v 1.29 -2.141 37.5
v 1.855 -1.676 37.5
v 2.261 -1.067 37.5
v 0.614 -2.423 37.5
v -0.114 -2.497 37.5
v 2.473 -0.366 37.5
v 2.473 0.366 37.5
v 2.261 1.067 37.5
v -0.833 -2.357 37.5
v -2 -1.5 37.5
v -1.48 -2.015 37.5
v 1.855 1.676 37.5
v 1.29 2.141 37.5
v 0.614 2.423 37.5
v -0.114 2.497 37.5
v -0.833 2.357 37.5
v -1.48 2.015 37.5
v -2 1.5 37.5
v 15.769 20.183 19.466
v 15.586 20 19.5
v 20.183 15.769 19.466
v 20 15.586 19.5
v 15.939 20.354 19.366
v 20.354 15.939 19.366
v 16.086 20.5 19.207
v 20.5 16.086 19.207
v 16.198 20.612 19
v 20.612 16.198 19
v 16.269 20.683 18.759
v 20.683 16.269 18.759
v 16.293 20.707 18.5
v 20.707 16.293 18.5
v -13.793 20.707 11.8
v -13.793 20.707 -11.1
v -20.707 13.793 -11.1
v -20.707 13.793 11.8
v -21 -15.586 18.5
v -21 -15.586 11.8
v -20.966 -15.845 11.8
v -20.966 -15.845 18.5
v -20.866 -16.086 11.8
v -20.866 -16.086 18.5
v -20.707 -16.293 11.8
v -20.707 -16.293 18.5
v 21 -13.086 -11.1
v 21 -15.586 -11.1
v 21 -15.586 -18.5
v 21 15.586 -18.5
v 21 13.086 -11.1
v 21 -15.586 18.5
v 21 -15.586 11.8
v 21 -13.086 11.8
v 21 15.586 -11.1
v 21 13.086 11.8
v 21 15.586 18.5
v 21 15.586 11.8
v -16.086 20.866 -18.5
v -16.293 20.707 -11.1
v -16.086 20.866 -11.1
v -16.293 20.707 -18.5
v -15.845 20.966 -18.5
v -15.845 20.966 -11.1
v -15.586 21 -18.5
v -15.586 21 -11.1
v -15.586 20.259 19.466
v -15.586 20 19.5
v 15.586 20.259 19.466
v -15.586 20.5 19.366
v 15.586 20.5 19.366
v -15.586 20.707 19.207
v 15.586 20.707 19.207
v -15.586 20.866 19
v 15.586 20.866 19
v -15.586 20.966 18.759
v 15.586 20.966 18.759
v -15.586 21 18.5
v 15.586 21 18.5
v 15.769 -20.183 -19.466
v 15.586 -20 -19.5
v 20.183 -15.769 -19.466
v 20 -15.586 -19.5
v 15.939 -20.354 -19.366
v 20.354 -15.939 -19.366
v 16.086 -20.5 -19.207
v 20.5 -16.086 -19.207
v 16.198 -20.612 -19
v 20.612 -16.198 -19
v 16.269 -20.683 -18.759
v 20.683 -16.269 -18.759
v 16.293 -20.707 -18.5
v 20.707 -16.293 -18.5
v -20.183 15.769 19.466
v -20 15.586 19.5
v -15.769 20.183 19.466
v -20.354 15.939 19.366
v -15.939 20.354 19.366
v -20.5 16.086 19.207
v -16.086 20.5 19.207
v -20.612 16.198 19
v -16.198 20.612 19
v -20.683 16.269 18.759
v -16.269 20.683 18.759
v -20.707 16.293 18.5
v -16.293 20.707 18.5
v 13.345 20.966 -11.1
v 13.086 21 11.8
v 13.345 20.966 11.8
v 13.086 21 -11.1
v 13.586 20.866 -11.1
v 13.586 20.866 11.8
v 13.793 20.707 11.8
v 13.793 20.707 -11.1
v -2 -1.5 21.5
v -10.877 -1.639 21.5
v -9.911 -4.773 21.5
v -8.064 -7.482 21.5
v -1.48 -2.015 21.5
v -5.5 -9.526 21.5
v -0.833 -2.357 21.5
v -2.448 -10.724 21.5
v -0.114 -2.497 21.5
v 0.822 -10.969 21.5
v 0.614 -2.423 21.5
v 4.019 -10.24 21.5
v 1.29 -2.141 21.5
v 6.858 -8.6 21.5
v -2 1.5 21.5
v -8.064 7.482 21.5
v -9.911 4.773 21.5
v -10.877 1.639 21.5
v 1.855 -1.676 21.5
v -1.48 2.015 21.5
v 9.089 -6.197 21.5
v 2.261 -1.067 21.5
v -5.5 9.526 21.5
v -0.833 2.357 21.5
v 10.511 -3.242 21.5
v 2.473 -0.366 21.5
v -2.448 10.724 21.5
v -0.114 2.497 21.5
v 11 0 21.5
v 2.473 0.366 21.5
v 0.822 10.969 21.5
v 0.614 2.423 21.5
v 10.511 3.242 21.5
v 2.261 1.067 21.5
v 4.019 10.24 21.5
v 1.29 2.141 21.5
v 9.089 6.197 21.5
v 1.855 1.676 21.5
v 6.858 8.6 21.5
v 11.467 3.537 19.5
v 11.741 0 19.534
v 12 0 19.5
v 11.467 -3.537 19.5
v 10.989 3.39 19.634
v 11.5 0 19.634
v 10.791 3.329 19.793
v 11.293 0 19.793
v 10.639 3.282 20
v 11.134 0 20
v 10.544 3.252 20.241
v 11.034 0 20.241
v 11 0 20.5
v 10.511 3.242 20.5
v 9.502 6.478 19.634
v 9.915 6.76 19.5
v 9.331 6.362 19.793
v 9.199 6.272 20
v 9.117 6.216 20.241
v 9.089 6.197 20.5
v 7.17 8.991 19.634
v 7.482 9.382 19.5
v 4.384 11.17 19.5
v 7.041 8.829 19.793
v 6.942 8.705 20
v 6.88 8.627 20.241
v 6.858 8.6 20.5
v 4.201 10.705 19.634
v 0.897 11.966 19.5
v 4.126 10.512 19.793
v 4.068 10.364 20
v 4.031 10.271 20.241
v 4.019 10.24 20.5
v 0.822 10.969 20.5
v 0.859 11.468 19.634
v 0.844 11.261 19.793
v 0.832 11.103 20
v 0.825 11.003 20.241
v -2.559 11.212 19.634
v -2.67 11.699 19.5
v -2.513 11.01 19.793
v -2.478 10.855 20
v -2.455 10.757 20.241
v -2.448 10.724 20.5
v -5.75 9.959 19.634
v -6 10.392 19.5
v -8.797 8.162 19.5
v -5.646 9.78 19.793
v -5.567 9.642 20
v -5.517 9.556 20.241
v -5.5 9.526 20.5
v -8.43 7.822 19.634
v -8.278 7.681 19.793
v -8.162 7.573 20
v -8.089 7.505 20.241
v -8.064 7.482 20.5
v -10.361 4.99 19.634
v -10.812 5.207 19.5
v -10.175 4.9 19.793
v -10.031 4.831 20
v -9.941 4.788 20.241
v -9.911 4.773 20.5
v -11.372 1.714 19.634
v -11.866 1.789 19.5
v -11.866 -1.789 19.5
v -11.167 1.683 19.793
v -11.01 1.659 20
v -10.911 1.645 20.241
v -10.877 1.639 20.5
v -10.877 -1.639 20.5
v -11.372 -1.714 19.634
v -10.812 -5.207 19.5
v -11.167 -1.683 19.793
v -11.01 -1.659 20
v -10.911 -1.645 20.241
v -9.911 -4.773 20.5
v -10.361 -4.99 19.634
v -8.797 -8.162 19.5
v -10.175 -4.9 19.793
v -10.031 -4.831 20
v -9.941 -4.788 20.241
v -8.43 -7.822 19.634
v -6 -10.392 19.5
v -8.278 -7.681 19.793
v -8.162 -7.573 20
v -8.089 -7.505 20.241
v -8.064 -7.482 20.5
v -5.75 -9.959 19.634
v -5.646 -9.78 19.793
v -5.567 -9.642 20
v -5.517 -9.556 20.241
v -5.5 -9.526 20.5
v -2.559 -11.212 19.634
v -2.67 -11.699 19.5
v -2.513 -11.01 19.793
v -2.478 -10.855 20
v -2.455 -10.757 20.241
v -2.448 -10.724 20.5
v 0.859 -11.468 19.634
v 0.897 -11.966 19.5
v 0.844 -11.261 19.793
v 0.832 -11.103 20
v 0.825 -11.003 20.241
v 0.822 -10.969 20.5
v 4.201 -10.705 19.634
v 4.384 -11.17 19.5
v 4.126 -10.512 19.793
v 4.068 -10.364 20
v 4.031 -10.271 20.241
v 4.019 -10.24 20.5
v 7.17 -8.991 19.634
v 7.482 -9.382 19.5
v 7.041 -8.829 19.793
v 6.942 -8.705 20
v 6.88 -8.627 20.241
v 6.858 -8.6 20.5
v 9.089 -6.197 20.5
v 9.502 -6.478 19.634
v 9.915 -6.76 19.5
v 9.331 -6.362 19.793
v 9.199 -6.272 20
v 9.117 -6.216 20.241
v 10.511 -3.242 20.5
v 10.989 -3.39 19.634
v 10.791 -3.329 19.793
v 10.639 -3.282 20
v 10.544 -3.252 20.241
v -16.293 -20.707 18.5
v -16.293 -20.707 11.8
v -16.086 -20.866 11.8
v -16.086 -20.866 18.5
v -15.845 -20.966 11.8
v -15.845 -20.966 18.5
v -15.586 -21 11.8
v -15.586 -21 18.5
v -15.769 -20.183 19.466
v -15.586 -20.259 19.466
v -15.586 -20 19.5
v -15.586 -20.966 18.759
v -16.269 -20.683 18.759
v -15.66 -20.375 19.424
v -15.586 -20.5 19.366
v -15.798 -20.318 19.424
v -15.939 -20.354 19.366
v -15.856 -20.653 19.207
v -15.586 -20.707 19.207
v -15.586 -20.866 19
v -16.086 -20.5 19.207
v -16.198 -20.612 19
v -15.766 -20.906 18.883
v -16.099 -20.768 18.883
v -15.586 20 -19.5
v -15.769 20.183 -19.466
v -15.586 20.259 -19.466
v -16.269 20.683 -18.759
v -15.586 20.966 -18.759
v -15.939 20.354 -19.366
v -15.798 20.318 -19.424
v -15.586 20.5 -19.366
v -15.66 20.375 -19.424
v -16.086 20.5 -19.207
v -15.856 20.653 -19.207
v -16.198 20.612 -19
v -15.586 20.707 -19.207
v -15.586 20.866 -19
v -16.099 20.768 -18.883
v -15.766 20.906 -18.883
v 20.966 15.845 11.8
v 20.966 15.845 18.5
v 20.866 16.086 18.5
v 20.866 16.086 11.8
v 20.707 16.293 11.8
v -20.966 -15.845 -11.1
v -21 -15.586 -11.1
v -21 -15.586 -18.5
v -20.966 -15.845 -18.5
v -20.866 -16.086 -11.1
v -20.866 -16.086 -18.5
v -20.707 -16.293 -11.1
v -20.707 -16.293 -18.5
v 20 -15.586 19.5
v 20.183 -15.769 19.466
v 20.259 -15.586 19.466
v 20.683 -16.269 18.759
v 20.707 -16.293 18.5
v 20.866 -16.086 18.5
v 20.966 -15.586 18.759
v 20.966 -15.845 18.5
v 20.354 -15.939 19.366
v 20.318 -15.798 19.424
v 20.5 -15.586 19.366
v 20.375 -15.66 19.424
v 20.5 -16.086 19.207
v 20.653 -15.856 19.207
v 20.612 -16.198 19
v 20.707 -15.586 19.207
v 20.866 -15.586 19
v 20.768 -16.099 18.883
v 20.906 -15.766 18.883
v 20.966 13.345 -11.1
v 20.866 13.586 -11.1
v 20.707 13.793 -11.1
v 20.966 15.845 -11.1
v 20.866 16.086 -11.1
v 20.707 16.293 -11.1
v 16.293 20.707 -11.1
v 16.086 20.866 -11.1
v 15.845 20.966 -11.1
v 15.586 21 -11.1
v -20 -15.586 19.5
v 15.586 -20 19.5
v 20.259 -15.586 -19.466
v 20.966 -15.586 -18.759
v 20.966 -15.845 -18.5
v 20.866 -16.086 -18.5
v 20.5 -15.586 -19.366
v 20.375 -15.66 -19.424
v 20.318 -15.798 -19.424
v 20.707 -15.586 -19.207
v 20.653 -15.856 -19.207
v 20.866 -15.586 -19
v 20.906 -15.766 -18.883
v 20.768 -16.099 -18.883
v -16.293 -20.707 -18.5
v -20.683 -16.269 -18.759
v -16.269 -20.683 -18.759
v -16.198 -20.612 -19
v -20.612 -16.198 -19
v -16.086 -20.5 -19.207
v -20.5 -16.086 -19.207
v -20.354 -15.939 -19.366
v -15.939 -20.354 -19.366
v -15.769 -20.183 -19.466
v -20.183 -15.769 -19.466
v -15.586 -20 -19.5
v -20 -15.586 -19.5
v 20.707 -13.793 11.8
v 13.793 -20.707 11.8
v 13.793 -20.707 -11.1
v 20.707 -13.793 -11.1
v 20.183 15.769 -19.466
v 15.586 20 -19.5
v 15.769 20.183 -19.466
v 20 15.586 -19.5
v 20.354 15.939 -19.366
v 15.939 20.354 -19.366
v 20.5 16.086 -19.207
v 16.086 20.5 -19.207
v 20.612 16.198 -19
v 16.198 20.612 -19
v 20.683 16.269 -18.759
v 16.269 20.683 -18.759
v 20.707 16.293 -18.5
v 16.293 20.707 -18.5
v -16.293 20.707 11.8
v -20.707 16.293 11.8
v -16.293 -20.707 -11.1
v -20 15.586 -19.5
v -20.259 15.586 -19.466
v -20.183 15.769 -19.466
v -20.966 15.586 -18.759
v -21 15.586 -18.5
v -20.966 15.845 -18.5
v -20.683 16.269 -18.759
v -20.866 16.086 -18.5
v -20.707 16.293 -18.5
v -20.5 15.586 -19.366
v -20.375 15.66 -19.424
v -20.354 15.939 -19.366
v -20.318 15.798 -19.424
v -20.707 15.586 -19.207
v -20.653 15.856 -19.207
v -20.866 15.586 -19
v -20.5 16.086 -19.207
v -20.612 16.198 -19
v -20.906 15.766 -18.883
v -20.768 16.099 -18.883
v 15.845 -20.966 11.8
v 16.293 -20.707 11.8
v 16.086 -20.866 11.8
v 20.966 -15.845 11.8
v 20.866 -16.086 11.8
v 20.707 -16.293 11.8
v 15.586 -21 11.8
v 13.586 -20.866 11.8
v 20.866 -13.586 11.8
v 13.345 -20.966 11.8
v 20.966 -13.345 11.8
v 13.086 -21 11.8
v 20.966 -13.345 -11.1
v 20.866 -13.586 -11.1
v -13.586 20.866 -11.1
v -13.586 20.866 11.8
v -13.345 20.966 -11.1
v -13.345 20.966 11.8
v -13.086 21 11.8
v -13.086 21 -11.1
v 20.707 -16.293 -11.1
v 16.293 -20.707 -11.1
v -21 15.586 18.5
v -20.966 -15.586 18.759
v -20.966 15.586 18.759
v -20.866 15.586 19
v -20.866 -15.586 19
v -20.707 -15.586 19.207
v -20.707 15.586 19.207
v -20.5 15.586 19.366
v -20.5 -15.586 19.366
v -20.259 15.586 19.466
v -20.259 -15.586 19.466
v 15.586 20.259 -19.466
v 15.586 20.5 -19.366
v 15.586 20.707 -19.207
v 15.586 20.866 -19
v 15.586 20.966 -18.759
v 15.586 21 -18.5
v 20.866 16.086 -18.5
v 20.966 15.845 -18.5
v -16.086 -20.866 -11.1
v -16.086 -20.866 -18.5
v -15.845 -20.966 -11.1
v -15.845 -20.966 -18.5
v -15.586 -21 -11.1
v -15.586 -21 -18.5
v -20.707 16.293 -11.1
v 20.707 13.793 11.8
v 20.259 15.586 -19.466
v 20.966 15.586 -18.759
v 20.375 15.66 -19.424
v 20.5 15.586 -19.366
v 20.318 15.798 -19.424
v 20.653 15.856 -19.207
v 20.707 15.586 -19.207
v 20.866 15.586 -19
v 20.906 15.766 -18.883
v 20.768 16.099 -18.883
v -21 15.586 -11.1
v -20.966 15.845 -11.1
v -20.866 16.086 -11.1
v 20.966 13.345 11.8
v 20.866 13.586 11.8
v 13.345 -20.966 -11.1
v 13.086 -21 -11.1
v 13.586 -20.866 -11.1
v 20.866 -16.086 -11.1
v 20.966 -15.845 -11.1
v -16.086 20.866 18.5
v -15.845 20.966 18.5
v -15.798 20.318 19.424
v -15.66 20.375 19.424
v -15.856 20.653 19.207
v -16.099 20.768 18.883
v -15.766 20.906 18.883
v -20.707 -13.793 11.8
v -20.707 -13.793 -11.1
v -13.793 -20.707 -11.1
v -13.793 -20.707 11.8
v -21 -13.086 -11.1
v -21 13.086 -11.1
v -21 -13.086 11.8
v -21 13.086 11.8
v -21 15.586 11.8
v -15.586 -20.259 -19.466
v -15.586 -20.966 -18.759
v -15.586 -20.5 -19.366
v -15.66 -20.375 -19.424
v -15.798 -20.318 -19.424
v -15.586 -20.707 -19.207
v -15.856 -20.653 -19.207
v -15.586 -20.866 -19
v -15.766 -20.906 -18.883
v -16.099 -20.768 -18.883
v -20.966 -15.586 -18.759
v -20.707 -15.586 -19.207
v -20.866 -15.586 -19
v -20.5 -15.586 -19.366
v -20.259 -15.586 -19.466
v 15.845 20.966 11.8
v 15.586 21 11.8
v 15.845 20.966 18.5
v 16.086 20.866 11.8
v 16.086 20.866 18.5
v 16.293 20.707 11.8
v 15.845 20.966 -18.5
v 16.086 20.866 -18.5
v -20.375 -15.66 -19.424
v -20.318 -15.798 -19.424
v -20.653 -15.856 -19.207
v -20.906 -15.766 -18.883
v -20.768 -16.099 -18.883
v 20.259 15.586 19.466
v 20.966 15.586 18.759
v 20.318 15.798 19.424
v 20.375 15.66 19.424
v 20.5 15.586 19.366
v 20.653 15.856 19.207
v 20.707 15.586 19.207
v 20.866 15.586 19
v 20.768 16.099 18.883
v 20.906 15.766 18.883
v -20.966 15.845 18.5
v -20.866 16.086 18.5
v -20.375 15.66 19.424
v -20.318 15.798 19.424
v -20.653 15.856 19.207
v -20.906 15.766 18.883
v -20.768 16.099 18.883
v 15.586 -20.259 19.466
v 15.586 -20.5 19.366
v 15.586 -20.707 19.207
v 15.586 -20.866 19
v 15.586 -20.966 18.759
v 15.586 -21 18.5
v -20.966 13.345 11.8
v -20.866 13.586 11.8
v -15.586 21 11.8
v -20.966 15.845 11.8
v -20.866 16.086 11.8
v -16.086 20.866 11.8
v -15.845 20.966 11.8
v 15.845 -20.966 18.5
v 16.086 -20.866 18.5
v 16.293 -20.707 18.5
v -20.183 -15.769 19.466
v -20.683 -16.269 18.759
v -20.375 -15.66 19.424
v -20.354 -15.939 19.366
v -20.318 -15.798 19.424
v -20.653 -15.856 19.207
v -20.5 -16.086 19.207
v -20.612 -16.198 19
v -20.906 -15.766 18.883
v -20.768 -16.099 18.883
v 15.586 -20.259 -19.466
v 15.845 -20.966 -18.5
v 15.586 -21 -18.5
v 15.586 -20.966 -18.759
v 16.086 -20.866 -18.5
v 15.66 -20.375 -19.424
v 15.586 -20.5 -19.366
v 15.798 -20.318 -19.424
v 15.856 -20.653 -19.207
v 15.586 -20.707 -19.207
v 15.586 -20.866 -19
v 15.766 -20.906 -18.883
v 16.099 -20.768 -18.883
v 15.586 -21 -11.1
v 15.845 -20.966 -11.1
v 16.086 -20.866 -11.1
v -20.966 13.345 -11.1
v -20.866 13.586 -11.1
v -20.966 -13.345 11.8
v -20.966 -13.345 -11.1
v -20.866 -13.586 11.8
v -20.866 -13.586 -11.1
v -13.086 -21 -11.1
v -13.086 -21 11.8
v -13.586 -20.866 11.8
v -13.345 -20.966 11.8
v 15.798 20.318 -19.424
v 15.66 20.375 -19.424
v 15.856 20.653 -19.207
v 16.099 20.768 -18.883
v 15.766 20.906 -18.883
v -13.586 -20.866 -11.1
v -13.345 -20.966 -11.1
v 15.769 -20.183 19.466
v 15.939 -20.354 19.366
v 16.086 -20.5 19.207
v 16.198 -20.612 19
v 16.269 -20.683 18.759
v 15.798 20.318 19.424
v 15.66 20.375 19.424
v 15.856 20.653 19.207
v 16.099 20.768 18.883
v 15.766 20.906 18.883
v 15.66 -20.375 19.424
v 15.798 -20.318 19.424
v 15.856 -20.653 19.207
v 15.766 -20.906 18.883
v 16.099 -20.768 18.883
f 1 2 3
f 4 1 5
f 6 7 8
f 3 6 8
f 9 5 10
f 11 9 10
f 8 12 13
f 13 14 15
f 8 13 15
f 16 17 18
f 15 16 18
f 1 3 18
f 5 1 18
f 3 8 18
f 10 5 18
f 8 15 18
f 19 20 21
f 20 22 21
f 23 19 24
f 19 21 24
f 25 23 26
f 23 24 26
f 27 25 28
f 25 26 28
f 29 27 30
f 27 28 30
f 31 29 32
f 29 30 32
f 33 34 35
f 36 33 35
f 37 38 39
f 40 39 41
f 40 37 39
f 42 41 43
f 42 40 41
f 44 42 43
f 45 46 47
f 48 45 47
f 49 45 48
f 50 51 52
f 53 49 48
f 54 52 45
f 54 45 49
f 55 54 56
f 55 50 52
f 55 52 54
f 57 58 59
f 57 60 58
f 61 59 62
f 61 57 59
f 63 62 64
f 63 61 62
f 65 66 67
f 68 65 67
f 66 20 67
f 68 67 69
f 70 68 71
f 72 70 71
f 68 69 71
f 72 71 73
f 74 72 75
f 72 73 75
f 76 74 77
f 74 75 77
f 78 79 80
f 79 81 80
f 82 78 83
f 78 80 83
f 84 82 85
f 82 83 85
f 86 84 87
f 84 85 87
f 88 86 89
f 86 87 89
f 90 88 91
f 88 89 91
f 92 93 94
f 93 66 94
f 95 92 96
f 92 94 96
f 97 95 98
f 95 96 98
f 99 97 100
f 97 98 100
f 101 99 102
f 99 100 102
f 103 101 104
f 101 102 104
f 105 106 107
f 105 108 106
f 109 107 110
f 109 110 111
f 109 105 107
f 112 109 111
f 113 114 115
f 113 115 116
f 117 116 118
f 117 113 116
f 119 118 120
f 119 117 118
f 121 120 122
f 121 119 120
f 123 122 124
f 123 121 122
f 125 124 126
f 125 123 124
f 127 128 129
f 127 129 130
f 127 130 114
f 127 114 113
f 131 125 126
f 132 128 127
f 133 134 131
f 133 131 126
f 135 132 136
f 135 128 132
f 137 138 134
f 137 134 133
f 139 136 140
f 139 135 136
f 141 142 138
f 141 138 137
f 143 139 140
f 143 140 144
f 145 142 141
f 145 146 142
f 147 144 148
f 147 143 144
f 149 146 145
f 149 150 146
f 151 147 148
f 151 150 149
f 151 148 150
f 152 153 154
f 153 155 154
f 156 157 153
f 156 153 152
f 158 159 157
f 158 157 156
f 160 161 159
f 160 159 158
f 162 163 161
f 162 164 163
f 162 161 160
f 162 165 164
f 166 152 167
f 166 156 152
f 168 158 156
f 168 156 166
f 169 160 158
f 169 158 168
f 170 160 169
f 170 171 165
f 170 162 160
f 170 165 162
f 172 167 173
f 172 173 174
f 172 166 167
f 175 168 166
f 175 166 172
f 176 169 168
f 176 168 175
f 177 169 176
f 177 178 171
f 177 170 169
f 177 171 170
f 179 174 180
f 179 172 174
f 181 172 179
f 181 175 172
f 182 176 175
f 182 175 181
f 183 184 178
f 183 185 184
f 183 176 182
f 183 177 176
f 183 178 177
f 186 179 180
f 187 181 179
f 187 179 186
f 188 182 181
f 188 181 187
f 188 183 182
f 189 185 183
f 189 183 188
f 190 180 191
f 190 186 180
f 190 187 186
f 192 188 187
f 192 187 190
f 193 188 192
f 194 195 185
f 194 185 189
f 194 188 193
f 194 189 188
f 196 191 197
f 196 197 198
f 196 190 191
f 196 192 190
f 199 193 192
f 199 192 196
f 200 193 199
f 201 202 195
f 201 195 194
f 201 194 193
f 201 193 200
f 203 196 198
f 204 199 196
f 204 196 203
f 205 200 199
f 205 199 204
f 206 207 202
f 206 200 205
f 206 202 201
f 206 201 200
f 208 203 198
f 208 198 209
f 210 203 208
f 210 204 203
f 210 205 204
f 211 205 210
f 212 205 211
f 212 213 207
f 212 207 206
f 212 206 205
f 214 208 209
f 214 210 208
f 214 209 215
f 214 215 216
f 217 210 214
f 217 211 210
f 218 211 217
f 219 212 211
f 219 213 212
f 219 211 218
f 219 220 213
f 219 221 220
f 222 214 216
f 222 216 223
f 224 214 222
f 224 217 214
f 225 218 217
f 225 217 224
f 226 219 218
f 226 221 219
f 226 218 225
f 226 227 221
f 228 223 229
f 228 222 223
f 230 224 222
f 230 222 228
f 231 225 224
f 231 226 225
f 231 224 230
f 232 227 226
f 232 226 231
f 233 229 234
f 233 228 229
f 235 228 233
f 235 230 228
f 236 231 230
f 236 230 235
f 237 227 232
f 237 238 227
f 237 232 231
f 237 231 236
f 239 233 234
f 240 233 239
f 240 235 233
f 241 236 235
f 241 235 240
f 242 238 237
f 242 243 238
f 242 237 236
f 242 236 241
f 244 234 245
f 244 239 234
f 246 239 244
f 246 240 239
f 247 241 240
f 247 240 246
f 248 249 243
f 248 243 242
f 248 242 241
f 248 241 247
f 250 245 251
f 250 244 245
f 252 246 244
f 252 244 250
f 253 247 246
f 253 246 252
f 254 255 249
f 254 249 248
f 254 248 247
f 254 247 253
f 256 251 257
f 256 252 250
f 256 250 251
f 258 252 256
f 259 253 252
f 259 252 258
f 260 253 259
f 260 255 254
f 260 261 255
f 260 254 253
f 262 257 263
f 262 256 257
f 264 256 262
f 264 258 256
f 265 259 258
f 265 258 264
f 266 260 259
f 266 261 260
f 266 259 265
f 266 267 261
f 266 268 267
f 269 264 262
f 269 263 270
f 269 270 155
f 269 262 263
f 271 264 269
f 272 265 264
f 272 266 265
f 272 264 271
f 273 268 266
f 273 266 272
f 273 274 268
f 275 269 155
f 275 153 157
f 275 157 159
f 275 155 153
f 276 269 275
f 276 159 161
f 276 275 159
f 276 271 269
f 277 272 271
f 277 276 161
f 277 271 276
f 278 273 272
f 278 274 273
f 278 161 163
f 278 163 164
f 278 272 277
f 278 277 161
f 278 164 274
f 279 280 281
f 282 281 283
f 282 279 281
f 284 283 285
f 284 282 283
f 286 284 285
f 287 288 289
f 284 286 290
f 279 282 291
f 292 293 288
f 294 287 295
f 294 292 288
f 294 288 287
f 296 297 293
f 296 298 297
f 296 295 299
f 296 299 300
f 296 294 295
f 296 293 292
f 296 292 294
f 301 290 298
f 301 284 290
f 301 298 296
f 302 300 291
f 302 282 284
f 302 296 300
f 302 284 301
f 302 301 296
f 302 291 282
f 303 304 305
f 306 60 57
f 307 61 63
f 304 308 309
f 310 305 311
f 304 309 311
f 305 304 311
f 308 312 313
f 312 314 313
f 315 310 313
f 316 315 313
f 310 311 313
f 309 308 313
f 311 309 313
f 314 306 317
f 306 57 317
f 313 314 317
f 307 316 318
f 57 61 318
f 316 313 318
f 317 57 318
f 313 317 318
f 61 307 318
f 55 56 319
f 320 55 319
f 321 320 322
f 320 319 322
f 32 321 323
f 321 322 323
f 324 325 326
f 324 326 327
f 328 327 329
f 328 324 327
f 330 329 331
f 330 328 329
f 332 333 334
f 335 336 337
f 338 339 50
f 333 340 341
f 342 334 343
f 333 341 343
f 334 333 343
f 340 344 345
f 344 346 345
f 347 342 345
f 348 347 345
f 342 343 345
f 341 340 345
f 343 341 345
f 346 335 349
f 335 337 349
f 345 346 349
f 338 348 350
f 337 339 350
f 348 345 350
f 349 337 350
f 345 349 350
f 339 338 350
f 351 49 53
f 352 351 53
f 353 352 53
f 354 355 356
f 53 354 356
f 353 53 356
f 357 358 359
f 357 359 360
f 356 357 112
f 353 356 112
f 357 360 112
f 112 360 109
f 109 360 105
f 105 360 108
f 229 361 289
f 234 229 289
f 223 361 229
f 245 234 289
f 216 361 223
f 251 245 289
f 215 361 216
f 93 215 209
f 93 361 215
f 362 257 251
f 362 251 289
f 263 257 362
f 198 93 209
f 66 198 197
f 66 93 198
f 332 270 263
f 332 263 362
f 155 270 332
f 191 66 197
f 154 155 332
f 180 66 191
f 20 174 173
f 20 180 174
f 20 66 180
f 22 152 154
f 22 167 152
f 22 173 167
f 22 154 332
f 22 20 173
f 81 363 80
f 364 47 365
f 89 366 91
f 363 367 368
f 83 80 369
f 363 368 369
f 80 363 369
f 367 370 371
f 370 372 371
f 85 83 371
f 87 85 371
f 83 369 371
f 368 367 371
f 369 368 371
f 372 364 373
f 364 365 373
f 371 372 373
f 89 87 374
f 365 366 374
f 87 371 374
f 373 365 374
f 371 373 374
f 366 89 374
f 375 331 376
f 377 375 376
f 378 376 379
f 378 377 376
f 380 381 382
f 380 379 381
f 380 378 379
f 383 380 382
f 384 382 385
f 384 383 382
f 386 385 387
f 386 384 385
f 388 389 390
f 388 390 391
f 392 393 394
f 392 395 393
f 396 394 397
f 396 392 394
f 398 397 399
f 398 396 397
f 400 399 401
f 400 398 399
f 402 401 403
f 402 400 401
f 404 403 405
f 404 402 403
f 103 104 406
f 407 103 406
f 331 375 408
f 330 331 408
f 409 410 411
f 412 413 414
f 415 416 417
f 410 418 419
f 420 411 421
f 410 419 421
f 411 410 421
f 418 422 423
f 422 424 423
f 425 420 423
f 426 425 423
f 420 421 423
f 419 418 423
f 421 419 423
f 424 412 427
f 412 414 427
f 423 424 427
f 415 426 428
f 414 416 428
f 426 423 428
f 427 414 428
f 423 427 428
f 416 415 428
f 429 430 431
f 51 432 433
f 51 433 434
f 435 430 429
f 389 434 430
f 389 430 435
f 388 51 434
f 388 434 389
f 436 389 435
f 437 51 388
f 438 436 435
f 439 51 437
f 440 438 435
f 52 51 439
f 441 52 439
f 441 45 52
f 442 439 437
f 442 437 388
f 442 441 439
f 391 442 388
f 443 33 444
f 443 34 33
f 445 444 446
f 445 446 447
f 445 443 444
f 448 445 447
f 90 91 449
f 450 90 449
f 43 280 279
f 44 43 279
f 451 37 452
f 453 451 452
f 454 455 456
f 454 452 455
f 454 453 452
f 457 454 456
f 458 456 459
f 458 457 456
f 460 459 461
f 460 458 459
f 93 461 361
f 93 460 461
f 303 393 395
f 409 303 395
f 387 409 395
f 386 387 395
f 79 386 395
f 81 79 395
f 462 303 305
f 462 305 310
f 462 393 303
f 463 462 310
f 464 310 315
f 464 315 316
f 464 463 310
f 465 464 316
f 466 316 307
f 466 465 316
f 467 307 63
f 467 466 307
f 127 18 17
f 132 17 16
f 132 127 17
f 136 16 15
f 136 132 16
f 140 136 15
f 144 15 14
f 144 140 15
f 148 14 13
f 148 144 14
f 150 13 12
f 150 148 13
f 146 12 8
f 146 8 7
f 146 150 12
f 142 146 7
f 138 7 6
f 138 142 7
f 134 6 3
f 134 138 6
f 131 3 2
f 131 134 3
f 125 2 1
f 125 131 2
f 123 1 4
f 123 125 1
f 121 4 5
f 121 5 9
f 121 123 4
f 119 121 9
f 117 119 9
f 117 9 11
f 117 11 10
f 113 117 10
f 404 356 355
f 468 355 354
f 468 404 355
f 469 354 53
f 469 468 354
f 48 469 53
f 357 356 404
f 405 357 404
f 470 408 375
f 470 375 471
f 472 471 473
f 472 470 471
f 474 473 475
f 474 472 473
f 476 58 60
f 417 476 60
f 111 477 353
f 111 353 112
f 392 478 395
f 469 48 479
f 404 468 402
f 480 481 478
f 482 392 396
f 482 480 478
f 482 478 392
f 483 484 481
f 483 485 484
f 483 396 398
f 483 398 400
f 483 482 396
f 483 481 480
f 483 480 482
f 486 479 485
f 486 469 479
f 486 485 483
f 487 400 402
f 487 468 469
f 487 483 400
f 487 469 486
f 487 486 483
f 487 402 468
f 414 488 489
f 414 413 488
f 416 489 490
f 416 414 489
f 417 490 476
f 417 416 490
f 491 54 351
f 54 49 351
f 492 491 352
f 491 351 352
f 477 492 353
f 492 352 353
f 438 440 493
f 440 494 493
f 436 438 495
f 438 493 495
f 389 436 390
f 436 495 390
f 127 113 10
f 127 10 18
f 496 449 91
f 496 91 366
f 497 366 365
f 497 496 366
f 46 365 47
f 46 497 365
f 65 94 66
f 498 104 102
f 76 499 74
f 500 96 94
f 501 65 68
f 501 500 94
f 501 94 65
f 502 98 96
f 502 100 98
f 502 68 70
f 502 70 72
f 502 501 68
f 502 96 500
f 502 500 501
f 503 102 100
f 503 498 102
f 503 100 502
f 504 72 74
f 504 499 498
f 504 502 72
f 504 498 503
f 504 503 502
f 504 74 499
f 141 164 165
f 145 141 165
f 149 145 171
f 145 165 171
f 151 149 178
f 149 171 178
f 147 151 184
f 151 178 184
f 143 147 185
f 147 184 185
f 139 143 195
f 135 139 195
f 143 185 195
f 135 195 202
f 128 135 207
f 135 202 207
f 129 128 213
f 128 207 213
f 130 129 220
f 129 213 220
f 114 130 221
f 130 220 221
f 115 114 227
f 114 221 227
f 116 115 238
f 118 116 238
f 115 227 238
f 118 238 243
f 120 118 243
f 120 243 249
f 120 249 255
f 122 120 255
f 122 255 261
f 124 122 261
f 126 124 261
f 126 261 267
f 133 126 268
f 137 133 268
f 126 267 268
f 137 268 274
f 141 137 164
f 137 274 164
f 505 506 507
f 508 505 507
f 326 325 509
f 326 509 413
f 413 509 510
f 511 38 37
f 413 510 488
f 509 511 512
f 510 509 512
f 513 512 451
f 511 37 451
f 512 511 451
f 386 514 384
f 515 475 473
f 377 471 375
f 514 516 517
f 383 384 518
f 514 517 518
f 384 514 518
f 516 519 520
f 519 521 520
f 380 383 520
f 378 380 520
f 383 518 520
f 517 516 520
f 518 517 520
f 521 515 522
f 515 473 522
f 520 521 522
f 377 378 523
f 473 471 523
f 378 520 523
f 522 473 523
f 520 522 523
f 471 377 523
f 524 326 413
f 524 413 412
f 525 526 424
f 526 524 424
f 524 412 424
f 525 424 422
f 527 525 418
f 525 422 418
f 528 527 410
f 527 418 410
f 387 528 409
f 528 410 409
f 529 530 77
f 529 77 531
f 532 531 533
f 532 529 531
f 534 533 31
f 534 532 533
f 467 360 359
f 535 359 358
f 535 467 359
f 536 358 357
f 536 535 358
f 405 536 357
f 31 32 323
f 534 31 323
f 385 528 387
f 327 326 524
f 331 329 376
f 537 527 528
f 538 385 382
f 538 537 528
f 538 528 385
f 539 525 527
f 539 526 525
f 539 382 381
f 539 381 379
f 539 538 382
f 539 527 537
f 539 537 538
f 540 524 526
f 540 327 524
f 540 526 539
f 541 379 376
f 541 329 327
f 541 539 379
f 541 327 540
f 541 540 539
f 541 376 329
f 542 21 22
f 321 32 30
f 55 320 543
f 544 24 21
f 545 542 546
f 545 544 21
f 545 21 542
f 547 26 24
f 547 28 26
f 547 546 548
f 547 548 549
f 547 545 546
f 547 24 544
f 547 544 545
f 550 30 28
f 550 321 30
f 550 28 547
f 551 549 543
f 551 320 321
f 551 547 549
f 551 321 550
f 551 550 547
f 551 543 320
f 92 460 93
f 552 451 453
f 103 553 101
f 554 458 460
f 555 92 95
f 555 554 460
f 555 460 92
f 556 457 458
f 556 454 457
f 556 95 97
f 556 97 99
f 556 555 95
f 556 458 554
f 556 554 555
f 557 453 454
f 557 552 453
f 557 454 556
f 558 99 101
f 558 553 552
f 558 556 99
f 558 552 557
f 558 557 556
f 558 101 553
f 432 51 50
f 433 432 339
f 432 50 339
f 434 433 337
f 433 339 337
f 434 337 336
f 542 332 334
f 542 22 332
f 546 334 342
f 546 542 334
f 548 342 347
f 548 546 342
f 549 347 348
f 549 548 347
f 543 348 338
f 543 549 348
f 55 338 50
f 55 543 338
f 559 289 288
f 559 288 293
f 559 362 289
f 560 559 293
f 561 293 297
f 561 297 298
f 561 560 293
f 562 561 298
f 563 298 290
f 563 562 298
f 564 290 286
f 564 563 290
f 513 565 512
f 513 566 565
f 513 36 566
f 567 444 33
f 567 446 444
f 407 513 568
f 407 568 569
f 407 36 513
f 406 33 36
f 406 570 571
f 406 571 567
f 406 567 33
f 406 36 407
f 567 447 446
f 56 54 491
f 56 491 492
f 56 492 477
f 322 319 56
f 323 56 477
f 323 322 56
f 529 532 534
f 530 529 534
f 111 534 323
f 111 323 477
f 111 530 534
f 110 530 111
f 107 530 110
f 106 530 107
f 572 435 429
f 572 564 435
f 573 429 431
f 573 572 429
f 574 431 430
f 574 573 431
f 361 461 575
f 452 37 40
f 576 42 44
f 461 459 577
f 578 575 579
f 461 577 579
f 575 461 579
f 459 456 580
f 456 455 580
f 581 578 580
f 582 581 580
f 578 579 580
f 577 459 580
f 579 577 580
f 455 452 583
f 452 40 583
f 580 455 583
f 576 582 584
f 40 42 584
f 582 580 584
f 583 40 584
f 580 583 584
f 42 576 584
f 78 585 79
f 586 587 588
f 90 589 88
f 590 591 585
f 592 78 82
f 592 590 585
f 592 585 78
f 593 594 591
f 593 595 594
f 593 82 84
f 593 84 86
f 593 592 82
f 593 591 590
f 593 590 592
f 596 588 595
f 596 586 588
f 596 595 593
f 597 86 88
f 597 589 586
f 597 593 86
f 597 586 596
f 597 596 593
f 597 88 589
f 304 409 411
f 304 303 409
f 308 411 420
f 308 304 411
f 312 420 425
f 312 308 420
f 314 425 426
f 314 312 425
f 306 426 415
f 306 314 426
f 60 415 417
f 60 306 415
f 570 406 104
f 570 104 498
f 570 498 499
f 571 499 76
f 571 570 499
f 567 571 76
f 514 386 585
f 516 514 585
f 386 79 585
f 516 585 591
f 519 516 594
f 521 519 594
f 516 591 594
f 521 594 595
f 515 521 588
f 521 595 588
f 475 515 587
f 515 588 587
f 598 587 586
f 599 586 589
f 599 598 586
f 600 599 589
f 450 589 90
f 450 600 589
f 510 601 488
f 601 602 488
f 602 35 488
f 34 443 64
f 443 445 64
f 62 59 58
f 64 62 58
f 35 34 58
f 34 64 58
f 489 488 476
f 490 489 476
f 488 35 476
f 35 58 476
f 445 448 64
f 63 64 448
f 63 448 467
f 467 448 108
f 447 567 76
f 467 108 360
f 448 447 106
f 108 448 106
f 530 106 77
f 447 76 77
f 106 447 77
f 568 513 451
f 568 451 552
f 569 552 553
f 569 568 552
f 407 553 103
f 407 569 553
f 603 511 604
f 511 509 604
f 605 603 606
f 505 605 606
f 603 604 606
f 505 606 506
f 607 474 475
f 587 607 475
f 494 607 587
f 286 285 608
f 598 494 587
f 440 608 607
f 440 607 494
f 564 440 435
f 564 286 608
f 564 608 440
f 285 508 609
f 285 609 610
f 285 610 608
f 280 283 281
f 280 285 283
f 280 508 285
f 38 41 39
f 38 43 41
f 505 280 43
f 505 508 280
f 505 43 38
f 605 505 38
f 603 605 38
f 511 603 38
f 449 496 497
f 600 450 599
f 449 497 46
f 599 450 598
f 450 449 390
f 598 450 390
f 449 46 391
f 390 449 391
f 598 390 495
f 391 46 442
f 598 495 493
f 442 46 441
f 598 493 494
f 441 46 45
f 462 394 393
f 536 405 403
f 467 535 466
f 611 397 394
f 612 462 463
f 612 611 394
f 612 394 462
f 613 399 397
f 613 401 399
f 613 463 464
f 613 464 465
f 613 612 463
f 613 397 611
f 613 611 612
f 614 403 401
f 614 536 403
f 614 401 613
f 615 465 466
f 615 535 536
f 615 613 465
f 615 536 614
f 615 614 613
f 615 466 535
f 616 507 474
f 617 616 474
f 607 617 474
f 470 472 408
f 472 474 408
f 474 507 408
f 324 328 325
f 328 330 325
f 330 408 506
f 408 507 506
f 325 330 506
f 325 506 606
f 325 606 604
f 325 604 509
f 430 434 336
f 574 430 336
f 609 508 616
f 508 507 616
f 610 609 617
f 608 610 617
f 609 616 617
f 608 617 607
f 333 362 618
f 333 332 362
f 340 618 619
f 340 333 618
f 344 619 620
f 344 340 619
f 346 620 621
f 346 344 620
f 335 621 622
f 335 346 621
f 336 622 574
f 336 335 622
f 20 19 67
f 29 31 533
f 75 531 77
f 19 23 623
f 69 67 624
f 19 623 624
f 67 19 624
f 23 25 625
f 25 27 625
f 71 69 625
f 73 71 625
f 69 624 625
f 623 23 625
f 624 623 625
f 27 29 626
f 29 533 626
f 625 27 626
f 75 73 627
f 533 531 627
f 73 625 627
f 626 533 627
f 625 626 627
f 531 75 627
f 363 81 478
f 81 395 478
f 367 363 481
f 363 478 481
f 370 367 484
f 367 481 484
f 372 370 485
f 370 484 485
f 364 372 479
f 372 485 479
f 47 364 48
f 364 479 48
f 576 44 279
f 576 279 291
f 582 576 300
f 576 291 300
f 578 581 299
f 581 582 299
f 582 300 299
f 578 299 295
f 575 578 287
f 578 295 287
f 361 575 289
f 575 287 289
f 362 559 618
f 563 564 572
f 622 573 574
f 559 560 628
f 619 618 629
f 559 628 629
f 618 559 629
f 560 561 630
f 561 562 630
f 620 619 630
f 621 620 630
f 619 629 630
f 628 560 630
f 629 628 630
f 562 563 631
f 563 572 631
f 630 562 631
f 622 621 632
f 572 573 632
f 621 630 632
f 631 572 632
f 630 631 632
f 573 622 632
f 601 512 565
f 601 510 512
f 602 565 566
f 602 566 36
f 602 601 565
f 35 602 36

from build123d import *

# Parameters (mm, degrees)
SKETCH1_W           = 42
SKETCH1_H           = 42
BOSS_EXTRUDE1_DEPTH = 19.5
CUT_EXTRUDE1_START  = -7.7
CUT_EXTRUDE1_DEPTH  = 22.9
SKETCH3_R           = 11
BOSS_EXTRUDE2_DEPTH = 2
CHAMFER1_SIZE       = 5
FILLET1_R           = 1
BOSS_EXTRUDE3_DEPTH = 16


with BuildPart() as part:
    # Sketch1 → Boss-Extrude1 (new, symmetric)
    with BuildSketch(Plane.XY):
        Rectangle(SKETCH1_W, SKETCH1_H)
    extrude(amount=BOSS_EXTRUDE1_DEPTH, both=True)

    # Sketch2 → Cut-Extrude1 (cut)
    with BuildSketch(Plane.XY.offset(19.5).offset(CUT_EXTRUDE1_START)):
        Polygon((-21, 21), (-13.5, 21), (-21, 13.5), align=None)
        Polygon((13.5, 21), (21, 21), (21, 13.5), align=None)
        Polygon((21, -13.5), (21, -21), (13.5, -21), align=None)
        Polygon((-13.5, -21), (-21, -21), (-21, -13.5), align=None)
    extrude(amount=-CUT_EXTRUDE1_DEPTH, mode=Mode.SUBTRACT)

    # Sketch3 → Boss-Extrude2 (add)
    with BuildSketch(Plane.XY.offset(19.5)):
        Circle(SKETCH3_R)
    extrude(amount=BOSS_EXTRUDE2_DEPTH)

    # Chamfer1
    chamfer1_edges = [part.edges().sort_by_distance(p)[0] for p in [
        (21, -21, -15.3),
        (-21, -21, -15.3),
        (-21, 21, -15.3),
        (21, 21, -15.3),
        (21, -21, 15.65),
        (-21, -21, 15.65),
        (-21, 21, 15.65),
        (21, 21, 15.65),
    ]]
    chamfer(chamfer1_edges, length=CHAMFER1_SIZE)

    # Fillet1
    fillet1_edges = [part.edges().sort_by_distance(p)[0] for p in [
        (-21, -13.5, 0.35),
        (-13.5, -21, 0.35),
        (13.5, -21, 0.35),
        (21, -13.5, 0.35),
        (21, 13.5, 0.35),
        (13.5, 21, 0.35),
        (-21, 13.5, 0.35),
        (-13.5, 21, 0.35),
        (-11, 0, 19.5),
        (0, 21, -19.5),
        (0, 21, 19.5),
        (-16, 21, 15.65),
        (-16, 21, -15.3),
        (16, 21, 15.65),
        (16, 21, -15.3),
        (21, 0, -19.5),
        (0, -21, -19.5),
        (-21, 0, -19.5),
        (-18.5, -18.5, -19.5),
        (-18.5, 18.5, -19.5),
        (18.5, -18.5, -19.5),
        (18.5, 18.5, -19.5),
        (21, 0, 19.5),
        (21, -16, -15.3),
        (21, -16, 15.65),
        (21, 16, 15.65),
        (21, 16, -15.3),
        (-21, 0, 19.5),
        (0, -21, 19.5),
        (-18.5, 18.5, 19.5),
        (-18.5, -18.5, 19.5),
        (18.5, -18.5, 19.5),
        (18.5, 18.5, 19.5),
        (-16, -21, 15.65),
        (-16, -21, -15.3),
        (16, -21, -15.3),
        (16, -21, 15.65),
        (-21, 16, 15.65),
        (-21, -16, 15.65),
        (-21, -16, -15.3),
        (-21, 16, -15.3),
    ]]
    fillet(fillet1_edges, radius=FILLET1_R)

    # Sketch4 → Boss-Extrude3 (add)
    with BuildSketch(Plane.XY.offset(21.5)):
        with BuildLine():
            Line((-2, -1.5), (-2, 1.5))
            ThreePointArc((-2, 1.5), (2.5, 0), (-2, -1.5))
        make_face()
    extrude(amount=BOSS_EXTRUDE3_DEPTH)


solid = part.part
